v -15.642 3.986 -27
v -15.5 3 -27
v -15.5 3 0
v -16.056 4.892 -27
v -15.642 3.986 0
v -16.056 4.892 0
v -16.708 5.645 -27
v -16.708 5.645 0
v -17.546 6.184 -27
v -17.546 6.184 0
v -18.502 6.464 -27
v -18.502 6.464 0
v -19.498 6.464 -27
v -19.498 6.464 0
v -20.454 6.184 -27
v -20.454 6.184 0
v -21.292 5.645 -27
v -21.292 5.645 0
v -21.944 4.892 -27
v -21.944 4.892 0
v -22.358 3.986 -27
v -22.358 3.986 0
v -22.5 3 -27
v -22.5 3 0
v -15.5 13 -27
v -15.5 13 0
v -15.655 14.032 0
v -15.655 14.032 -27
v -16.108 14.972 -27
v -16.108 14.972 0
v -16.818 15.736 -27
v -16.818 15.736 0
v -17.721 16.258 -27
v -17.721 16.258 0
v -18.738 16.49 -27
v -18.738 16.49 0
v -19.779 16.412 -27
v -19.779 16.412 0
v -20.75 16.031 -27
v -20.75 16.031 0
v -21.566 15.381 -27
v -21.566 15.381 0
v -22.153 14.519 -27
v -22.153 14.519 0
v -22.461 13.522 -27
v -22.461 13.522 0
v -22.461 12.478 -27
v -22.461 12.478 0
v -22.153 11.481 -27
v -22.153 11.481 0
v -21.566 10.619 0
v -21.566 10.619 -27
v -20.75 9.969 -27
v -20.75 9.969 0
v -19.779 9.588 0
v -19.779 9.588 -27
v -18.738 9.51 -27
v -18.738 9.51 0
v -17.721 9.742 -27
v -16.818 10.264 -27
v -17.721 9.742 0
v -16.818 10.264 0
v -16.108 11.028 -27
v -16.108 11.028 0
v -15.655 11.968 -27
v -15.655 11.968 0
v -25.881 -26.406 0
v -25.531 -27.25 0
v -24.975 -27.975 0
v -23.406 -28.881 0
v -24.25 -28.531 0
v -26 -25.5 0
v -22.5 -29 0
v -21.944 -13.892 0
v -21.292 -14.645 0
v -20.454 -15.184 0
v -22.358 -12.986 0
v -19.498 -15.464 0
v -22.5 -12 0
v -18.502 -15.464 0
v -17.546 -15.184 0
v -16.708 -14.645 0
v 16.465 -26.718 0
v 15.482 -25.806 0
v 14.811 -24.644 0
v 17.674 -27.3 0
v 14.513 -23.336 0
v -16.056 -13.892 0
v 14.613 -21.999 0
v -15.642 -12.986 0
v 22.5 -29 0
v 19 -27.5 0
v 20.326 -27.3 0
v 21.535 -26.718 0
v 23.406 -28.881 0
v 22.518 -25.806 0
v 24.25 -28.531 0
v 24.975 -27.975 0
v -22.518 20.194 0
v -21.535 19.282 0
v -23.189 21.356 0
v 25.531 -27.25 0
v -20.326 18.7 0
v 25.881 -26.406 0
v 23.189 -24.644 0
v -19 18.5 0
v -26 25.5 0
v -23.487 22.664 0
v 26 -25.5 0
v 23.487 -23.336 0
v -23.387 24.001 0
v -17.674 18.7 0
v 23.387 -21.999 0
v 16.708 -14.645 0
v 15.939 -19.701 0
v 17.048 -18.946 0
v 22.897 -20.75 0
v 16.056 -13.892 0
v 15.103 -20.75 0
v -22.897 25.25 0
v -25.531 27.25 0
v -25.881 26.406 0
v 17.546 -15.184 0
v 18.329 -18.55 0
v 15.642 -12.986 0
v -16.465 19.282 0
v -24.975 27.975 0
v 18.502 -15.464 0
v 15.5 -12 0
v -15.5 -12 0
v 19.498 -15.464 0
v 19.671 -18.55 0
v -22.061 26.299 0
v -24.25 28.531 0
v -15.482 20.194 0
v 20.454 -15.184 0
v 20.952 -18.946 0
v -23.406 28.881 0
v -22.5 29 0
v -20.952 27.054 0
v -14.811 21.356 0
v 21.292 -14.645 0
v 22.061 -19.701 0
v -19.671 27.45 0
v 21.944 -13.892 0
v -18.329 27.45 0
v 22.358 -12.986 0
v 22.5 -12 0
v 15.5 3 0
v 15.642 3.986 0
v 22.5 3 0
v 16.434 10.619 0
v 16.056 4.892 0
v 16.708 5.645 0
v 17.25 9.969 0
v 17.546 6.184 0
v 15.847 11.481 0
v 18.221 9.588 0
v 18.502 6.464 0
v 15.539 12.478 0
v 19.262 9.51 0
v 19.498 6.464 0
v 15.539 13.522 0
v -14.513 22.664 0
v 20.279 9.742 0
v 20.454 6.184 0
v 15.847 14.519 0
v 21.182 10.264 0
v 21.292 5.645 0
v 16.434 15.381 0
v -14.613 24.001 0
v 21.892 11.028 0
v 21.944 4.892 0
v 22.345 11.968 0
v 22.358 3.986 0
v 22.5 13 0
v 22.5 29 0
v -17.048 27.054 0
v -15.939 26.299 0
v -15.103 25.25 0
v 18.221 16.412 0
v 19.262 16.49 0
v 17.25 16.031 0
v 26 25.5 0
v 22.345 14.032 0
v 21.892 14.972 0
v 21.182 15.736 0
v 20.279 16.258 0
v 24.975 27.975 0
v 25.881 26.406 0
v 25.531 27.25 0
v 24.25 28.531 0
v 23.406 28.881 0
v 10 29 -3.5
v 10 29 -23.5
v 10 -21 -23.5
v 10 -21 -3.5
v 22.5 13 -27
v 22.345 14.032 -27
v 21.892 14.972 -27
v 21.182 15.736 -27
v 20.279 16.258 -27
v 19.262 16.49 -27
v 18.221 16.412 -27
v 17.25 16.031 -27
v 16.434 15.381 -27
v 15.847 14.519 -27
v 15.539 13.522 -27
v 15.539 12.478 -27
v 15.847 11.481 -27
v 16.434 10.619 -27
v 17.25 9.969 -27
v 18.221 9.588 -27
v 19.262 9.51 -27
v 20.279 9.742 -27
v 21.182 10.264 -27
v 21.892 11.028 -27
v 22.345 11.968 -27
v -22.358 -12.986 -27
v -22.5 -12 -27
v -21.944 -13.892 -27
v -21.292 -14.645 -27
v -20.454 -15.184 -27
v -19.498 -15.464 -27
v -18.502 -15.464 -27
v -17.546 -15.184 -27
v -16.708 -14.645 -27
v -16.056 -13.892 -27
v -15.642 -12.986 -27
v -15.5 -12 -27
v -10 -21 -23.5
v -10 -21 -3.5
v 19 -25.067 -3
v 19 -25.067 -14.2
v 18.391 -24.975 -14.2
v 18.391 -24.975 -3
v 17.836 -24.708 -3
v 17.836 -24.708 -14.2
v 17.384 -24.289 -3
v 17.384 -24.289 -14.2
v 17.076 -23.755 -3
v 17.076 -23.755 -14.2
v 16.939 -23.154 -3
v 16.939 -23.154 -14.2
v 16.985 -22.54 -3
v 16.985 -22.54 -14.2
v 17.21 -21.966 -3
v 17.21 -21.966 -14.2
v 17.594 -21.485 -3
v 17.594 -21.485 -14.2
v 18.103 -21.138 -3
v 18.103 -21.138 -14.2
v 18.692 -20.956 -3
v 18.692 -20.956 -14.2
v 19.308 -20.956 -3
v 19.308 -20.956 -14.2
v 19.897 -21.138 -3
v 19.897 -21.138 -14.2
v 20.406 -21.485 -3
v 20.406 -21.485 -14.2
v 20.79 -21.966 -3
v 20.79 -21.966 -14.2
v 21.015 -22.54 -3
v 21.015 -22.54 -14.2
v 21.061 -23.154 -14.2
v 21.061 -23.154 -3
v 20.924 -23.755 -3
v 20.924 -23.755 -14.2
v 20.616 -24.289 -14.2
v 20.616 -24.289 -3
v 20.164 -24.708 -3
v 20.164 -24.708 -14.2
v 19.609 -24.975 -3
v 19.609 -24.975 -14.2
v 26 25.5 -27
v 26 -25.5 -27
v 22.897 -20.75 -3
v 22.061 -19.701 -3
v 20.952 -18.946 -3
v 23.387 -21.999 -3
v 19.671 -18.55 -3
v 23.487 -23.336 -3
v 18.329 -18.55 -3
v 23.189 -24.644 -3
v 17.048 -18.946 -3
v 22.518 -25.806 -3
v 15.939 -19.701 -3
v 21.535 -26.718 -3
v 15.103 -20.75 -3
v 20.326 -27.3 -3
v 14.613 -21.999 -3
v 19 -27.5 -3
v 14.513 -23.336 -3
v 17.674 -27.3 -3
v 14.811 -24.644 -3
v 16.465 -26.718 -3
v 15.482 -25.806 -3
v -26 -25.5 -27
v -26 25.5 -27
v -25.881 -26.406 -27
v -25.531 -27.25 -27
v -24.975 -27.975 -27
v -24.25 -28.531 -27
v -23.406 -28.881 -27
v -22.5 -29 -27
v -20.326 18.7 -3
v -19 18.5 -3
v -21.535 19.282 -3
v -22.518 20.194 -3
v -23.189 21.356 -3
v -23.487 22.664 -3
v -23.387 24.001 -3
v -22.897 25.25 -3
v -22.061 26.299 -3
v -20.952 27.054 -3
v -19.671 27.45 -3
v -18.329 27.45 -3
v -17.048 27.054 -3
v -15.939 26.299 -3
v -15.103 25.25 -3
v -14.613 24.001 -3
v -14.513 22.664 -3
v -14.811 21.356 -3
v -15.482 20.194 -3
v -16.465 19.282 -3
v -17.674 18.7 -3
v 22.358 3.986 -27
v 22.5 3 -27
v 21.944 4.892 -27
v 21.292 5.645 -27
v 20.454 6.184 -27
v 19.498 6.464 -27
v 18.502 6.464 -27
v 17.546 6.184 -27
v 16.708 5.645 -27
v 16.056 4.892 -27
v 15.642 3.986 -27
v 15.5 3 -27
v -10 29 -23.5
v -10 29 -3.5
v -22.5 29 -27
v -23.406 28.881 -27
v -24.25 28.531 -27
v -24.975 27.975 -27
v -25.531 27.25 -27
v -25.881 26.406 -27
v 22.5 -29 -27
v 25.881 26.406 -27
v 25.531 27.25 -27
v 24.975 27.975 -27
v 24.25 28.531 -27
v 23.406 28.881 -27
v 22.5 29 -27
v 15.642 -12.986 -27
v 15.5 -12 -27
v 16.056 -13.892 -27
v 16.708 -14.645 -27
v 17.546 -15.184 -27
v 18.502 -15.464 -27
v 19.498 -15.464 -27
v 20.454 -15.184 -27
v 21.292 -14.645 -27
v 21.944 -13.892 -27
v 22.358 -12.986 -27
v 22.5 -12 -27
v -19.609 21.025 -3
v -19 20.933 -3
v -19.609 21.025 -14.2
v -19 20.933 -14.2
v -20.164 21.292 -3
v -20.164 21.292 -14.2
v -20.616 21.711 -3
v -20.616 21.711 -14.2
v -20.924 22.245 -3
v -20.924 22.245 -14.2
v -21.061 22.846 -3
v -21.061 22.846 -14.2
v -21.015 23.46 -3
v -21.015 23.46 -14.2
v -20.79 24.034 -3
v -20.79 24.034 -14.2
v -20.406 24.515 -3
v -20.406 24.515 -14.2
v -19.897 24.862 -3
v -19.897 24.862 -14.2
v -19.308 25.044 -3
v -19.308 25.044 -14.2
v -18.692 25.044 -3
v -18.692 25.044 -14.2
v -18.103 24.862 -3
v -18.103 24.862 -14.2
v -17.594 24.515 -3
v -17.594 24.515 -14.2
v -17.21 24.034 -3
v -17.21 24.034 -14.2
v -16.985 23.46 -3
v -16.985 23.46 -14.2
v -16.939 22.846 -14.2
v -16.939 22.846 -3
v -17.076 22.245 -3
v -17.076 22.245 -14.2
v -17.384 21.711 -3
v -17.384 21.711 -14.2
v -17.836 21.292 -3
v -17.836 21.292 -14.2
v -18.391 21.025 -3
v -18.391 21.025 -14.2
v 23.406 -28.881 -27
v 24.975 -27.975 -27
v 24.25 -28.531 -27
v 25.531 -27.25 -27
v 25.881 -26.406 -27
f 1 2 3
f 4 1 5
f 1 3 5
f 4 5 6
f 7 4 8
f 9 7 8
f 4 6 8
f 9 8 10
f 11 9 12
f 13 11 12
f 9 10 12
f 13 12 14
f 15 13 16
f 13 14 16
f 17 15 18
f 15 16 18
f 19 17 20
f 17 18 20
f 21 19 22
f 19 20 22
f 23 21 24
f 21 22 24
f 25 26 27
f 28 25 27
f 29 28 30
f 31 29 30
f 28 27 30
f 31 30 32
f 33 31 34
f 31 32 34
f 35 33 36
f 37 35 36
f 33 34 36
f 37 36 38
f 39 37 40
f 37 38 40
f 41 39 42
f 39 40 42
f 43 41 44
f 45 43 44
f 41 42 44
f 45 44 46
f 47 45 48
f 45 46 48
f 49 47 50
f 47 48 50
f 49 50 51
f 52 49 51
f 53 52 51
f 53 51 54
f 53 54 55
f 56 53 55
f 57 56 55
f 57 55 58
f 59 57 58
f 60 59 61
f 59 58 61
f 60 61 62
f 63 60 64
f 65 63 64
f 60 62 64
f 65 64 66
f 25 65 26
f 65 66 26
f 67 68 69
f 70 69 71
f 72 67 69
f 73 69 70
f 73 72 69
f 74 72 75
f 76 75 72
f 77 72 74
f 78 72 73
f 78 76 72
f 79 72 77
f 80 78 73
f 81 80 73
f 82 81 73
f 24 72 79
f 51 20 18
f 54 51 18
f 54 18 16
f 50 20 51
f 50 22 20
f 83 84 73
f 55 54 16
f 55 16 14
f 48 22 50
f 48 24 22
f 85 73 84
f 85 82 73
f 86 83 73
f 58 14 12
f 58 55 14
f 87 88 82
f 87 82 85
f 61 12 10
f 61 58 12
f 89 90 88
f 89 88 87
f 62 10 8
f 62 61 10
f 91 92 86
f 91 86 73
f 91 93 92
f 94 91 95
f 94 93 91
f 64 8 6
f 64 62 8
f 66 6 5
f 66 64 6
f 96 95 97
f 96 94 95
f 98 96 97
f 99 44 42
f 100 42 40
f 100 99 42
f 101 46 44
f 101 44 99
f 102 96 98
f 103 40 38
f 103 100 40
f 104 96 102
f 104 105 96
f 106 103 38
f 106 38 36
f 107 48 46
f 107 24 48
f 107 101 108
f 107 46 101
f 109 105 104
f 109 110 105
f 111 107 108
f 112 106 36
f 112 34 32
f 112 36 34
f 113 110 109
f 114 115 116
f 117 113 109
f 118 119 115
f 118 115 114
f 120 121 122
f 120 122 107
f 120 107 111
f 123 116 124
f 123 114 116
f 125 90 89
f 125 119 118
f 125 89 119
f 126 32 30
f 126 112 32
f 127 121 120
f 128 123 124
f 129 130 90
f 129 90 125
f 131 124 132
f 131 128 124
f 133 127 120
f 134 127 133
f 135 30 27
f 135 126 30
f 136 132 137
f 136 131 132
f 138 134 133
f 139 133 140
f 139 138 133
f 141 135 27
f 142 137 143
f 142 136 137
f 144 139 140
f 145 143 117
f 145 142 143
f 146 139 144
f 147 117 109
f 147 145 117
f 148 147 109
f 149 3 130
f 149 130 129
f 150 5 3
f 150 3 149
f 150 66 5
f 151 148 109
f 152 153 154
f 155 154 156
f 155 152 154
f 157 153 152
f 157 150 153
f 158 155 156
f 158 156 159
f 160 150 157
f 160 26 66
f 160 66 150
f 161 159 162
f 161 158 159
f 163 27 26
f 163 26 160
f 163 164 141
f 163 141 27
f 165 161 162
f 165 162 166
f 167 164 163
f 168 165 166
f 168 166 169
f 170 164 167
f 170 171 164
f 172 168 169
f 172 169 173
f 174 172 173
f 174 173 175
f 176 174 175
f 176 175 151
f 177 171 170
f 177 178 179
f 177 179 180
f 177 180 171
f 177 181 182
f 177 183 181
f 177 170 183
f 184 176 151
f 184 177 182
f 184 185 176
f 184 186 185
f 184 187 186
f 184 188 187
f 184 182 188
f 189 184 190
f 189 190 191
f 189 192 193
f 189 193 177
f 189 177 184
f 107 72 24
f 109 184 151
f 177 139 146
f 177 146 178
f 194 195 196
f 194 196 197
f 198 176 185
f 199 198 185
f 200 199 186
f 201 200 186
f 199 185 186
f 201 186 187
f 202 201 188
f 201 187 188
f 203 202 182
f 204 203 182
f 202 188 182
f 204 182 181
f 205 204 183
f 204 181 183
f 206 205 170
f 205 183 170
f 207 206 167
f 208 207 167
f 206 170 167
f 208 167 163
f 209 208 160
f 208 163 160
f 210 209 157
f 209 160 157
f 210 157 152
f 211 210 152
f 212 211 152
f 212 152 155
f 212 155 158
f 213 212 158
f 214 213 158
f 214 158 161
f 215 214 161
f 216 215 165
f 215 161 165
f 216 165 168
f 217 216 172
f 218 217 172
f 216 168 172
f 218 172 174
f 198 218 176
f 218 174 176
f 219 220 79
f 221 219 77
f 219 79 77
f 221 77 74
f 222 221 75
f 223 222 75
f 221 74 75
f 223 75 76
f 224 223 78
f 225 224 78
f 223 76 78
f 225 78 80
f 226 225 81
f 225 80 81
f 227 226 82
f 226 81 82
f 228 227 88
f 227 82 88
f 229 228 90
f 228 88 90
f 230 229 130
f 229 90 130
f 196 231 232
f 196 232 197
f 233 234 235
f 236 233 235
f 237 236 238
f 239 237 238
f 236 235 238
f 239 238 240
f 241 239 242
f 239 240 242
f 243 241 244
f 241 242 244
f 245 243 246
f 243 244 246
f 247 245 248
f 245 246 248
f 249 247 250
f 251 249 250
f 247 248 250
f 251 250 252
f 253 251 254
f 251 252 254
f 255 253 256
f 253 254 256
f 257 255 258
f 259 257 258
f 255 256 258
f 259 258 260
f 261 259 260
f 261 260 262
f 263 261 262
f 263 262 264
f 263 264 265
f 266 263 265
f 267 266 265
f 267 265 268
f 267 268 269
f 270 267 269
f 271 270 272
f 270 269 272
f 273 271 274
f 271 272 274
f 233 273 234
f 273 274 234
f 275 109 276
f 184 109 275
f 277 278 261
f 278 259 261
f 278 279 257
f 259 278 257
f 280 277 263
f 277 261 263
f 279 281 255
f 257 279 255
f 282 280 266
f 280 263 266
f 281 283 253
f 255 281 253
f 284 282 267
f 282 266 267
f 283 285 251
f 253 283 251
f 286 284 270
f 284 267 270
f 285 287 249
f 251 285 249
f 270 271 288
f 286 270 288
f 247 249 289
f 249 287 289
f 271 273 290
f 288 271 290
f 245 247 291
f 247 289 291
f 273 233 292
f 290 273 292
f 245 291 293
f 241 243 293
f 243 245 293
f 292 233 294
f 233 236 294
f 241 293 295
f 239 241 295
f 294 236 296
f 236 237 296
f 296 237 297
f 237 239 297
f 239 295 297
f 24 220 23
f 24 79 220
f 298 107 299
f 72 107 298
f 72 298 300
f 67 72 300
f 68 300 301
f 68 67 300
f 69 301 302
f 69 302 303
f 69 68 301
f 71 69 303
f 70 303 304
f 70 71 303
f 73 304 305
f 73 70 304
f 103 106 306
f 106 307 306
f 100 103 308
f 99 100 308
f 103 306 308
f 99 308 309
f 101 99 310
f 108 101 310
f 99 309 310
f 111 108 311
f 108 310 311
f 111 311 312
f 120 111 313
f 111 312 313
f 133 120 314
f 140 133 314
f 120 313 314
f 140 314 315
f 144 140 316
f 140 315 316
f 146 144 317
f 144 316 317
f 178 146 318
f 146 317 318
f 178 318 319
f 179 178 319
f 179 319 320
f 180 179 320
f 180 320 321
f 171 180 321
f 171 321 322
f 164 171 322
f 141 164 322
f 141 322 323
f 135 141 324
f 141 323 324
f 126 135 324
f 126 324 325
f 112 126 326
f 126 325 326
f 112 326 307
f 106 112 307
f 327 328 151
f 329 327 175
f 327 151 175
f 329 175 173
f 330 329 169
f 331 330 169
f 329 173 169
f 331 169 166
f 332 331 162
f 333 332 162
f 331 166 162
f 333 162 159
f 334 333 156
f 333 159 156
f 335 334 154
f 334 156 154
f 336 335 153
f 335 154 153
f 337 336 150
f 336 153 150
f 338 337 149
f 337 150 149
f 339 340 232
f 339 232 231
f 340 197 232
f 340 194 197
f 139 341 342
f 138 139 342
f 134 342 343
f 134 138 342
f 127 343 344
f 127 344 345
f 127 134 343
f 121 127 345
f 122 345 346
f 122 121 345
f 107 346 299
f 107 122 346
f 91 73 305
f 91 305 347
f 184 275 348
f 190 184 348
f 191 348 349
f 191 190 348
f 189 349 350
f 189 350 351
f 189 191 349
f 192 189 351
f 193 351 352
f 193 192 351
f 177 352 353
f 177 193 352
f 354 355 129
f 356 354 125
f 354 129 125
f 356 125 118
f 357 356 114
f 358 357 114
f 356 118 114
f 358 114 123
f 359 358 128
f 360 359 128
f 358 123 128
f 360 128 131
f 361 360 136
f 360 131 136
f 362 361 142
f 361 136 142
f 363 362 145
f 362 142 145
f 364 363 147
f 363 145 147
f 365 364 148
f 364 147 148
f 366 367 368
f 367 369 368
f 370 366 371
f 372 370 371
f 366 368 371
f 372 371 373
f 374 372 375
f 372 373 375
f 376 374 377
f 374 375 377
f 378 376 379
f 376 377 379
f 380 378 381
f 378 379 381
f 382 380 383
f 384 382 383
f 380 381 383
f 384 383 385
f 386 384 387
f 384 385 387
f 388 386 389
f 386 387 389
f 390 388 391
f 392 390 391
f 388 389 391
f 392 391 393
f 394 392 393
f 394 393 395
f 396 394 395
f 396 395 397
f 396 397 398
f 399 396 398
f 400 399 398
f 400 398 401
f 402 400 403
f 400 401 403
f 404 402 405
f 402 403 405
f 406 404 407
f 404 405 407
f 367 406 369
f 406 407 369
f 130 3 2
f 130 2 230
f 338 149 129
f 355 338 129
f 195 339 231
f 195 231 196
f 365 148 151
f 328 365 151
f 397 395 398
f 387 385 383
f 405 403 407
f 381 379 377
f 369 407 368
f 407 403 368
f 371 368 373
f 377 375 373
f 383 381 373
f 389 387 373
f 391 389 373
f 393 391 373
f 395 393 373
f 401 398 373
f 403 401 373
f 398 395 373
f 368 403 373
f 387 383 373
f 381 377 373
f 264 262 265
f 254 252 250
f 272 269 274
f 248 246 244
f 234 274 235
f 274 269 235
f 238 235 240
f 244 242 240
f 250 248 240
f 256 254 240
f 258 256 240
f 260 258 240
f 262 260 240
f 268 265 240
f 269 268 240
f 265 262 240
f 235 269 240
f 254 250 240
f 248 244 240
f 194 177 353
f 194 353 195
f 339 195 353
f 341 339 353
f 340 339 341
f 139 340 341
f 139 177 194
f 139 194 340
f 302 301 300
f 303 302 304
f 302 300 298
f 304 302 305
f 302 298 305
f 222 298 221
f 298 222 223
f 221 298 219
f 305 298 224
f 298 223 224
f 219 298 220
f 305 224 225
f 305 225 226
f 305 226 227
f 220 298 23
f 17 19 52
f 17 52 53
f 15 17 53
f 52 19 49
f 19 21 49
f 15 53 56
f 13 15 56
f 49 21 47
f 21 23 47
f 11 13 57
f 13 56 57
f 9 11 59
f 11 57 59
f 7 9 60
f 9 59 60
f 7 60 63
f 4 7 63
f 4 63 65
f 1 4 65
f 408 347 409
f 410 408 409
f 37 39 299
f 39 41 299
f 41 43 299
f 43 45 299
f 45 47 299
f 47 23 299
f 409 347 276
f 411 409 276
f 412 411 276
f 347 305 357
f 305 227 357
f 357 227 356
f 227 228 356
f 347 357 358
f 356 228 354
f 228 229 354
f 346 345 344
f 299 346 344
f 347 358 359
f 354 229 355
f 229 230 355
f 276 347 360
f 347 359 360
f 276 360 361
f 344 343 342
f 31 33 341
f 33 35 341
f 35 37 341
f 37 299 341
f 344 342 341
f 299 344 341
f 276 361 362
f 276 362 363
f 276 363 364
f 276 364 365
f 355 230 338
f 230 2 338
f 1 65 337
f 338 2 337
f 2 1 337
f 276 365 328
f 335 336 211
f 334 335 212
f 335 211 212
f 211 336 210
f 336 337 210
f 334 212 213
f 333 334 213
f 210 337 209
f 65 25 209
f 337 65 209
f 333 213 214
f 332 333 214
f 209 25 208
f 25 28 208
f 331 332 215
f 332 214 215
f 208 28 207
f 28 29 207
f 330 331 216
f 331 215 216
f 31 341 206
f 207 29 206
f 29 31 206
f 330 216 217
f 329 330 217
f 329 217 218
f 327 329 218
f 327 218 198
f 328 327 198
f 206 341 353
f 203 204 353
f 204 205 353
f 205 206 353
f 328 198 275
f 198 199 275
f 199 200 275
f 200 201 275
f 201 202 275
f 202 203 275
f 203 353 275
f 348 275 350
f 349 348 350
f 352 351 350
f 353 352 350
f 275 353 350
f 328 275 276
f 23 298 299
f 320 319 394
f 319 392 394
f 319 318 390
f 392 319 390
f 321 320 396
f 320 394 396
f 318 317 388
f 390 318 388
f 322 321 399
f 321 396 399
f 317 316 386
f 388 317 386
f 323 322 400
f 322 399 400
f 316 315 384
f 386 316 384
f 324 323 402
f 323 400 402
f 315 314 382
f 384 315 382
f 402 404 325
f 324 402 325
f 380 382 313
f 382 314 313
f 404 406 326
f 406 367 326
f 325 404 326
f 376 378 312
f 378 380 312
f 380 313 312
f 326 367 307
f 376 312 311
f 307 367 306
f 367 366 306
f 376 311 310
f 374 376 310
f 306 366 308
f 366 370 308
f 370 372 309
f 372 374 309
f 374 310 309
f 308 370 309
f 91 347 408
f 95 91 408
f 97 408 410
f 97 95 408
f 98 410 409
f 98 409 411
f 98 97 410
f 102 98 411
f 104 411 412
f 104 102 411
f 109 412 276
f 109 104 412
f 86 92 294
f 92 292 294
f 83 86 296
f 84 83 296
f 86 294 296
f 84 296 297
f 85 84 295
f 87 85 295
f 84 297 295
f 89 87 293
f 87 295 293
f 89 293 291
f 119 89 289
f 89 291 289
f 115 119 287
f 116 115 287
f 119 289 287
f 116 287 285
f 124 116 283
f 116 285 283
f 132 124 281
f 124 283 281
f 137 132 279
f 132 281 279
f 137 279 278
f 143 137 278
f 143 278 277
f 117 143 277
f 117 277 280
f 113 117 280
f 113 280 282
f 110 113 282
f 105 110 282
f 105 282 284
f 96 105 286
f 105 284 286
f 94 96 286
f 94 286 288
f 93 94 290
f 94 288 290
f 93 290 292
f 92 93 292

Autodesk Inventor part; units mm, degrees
ref_plane "YZ Plane" through (0, 0, 0) normal (1, 0, 0) x (0, 1, 0)
ref_plane "XZ Plane" through (0, 0, 0) normal (0, 1, 0) x (-1, 0, 0)
ref_plane "XY Plane" through (0, 0, 0) normal (0, 0, 1) x (1, 0, 0)
sketch "Esquisse1" plane through (0, 0, 0) normal (0, 0, 1) x (1, 0, 0)
  line L0 (22.5, 29) -> (-22.5, 29)
  line L1 (-26, 25.5) -> (-26, -25.5)
  line L2 (-22.5, -29) -> (22.5, -29)
  line L3 (26, -25.5) -> (26, 25.5)
  line L4 (26, 29) -> (-26, -29) construction
  line L5 (-26, 29) -> (26, -29) construction
  line L6 (-19, 6.5) -> (-19, 6.5)
  line L7 (-15.5, 3) -> (-15.5, -12)
  line L8 (-19, -15.5) -> (-19, -15.5)
  line L9 (-22.5, -12) -> (-22.5, 3)
  line L10 (-22.5, 6.5) -> (-15.5, -15.5) construction
  line L11 (-15.5, 6.5) -> (-22.5, -15.5) construction
  circle A0 centre (-19, 13) radius 3.5
  arc A1 (-22.5, -12) -> (-19, -15.5) centre (-19, -12) ccw
  arc A2 (-19, -15.5) -> (-15.5, -12) centre (-19, -12) ccw
  arc A3 (-19, 6.5) -> (-22.5, 3) centre (-19, 3) ccw
  arc A4 (-15.5, 3) -> (-19, 6.5) centre (-19, 3) ccw
  line L12 (0, 45.9017) -> (0, -37.4412)
  line L13 (15.5, 3) -> (15.5, -12)
  line L14 (22.5, -12) -> (22.5, 3)
  circle A5 centre (19, 13) radius 3.5
  arc A6 (19, -15.5) -> (22.5, -12) centre (19, -12) ccw
  arc A7 (15.5, -12) -> (19, -15.5) centre (19, -12) ccw
  arc A8 (22.5, 3) -> (19, 6.5) centre (19, 3) ccw
  arc A9 (19, 6.5) -> (15.5, 3) centre (19, 3) ccw
  arc A10 (-26, -25.5) -> (-22.5, -29) centre (-22.5, -25.5) ccw
  arc A11 (-22.5, 29) -> (-26, 25.5) centre (-22.5, 25.5) ccw
  arc A12 (26, 25.5) -> (22.5, 29) centre (22.5, 25.5) ccw
  arc A13 (22.5, -29) -> (26, -25.5) centre (22.5, -25.5) ccw
  point P0 (0, 0)
  point P1 (-19, -4.5)
  point P2 (19, -15.5)
  point P3 (19, 6.5)
  point P4 (-19, 6.5)
  point P5 (-19, -15.5)
  dimension "d0" = 52
  dimension "d1" = 58
  dimension "d2" = 7
  dimension "d5" = 3.5
  dimension "d6" = 7
  dimension "d7" = 42
  dimension "d8" = 3.5
  dimension "d9" = 15
  dimension "d10" = 17
  dimension "d12" = 0
  dimension "d13" = 3.5
extrude "Extrusion1" add sketch "Esquisse1" against normal blind 27
sketch "Esquisse2" plane through (0, 0, 0) normal (0, 0, 1) x (1, 0, 0)
  line L0 (-22.5, -29) -> (22.5, -29) projected
  circle A0 centre (19, 13) radius 3.5 projected
  line L1 (19, 13) -> (19, -23)
  circle A1 centre (-19, 13) radius 3.5 projected
  line L2 (-19, 13) -> (-19, 23)
  line L3 (22.5, 29) -> (-22.5, 29) projected
  point P0 (0, 0)
  dimension "d23" = 6
  dimension "d25" = 6
hole "Perçage1" at (19, -23, 0) at (-19, 23, 0) direction (0, 0, -1) diameter 4.134 depth 14.2 counterbore diameter 9 counterbore depth 3 thread size "M5x0.8" class "6H" standard "ANSI Metric M Profile"
sketch "Esquisse3" plane through (-22.5, 29, 0) normal (0, 1, 0) x (1, 0, 0)
  line L0 (45, 0) -> (0, 0) projected
  line L1 (45, 0) -> (45, 27) projected
  line L2 (0, 27) -> (45, 27) projected
  line L3 (0, 0) -> (0, 27) projected
  line L4 (32.5, 3.5) -> (12.5, 3.5)
  line L5 (12.5, 3.5) -> (12.5, 23.5)
  line L6 (12.5, 23.5) -> (32.5, 23.5)
  line L7 (32.5, 23.5) -> (32.5, 3.5)
  line L8 (32.5, 3.5) -> (12.5, 23.5) construction
  line L9 (12.5, 3.5) -> (32.5, 23.5) construction
  point P0 (22.5, 0)
  point P1 (22.5, 13.5)
  dimension "d26" = 20
  dimension "d27" = 20
extrude "Extrusion2" cut sketch "Esquisse3" against normal blind 50 contours L4 L5 L6 L7
properties part number "SupportTendeur"
